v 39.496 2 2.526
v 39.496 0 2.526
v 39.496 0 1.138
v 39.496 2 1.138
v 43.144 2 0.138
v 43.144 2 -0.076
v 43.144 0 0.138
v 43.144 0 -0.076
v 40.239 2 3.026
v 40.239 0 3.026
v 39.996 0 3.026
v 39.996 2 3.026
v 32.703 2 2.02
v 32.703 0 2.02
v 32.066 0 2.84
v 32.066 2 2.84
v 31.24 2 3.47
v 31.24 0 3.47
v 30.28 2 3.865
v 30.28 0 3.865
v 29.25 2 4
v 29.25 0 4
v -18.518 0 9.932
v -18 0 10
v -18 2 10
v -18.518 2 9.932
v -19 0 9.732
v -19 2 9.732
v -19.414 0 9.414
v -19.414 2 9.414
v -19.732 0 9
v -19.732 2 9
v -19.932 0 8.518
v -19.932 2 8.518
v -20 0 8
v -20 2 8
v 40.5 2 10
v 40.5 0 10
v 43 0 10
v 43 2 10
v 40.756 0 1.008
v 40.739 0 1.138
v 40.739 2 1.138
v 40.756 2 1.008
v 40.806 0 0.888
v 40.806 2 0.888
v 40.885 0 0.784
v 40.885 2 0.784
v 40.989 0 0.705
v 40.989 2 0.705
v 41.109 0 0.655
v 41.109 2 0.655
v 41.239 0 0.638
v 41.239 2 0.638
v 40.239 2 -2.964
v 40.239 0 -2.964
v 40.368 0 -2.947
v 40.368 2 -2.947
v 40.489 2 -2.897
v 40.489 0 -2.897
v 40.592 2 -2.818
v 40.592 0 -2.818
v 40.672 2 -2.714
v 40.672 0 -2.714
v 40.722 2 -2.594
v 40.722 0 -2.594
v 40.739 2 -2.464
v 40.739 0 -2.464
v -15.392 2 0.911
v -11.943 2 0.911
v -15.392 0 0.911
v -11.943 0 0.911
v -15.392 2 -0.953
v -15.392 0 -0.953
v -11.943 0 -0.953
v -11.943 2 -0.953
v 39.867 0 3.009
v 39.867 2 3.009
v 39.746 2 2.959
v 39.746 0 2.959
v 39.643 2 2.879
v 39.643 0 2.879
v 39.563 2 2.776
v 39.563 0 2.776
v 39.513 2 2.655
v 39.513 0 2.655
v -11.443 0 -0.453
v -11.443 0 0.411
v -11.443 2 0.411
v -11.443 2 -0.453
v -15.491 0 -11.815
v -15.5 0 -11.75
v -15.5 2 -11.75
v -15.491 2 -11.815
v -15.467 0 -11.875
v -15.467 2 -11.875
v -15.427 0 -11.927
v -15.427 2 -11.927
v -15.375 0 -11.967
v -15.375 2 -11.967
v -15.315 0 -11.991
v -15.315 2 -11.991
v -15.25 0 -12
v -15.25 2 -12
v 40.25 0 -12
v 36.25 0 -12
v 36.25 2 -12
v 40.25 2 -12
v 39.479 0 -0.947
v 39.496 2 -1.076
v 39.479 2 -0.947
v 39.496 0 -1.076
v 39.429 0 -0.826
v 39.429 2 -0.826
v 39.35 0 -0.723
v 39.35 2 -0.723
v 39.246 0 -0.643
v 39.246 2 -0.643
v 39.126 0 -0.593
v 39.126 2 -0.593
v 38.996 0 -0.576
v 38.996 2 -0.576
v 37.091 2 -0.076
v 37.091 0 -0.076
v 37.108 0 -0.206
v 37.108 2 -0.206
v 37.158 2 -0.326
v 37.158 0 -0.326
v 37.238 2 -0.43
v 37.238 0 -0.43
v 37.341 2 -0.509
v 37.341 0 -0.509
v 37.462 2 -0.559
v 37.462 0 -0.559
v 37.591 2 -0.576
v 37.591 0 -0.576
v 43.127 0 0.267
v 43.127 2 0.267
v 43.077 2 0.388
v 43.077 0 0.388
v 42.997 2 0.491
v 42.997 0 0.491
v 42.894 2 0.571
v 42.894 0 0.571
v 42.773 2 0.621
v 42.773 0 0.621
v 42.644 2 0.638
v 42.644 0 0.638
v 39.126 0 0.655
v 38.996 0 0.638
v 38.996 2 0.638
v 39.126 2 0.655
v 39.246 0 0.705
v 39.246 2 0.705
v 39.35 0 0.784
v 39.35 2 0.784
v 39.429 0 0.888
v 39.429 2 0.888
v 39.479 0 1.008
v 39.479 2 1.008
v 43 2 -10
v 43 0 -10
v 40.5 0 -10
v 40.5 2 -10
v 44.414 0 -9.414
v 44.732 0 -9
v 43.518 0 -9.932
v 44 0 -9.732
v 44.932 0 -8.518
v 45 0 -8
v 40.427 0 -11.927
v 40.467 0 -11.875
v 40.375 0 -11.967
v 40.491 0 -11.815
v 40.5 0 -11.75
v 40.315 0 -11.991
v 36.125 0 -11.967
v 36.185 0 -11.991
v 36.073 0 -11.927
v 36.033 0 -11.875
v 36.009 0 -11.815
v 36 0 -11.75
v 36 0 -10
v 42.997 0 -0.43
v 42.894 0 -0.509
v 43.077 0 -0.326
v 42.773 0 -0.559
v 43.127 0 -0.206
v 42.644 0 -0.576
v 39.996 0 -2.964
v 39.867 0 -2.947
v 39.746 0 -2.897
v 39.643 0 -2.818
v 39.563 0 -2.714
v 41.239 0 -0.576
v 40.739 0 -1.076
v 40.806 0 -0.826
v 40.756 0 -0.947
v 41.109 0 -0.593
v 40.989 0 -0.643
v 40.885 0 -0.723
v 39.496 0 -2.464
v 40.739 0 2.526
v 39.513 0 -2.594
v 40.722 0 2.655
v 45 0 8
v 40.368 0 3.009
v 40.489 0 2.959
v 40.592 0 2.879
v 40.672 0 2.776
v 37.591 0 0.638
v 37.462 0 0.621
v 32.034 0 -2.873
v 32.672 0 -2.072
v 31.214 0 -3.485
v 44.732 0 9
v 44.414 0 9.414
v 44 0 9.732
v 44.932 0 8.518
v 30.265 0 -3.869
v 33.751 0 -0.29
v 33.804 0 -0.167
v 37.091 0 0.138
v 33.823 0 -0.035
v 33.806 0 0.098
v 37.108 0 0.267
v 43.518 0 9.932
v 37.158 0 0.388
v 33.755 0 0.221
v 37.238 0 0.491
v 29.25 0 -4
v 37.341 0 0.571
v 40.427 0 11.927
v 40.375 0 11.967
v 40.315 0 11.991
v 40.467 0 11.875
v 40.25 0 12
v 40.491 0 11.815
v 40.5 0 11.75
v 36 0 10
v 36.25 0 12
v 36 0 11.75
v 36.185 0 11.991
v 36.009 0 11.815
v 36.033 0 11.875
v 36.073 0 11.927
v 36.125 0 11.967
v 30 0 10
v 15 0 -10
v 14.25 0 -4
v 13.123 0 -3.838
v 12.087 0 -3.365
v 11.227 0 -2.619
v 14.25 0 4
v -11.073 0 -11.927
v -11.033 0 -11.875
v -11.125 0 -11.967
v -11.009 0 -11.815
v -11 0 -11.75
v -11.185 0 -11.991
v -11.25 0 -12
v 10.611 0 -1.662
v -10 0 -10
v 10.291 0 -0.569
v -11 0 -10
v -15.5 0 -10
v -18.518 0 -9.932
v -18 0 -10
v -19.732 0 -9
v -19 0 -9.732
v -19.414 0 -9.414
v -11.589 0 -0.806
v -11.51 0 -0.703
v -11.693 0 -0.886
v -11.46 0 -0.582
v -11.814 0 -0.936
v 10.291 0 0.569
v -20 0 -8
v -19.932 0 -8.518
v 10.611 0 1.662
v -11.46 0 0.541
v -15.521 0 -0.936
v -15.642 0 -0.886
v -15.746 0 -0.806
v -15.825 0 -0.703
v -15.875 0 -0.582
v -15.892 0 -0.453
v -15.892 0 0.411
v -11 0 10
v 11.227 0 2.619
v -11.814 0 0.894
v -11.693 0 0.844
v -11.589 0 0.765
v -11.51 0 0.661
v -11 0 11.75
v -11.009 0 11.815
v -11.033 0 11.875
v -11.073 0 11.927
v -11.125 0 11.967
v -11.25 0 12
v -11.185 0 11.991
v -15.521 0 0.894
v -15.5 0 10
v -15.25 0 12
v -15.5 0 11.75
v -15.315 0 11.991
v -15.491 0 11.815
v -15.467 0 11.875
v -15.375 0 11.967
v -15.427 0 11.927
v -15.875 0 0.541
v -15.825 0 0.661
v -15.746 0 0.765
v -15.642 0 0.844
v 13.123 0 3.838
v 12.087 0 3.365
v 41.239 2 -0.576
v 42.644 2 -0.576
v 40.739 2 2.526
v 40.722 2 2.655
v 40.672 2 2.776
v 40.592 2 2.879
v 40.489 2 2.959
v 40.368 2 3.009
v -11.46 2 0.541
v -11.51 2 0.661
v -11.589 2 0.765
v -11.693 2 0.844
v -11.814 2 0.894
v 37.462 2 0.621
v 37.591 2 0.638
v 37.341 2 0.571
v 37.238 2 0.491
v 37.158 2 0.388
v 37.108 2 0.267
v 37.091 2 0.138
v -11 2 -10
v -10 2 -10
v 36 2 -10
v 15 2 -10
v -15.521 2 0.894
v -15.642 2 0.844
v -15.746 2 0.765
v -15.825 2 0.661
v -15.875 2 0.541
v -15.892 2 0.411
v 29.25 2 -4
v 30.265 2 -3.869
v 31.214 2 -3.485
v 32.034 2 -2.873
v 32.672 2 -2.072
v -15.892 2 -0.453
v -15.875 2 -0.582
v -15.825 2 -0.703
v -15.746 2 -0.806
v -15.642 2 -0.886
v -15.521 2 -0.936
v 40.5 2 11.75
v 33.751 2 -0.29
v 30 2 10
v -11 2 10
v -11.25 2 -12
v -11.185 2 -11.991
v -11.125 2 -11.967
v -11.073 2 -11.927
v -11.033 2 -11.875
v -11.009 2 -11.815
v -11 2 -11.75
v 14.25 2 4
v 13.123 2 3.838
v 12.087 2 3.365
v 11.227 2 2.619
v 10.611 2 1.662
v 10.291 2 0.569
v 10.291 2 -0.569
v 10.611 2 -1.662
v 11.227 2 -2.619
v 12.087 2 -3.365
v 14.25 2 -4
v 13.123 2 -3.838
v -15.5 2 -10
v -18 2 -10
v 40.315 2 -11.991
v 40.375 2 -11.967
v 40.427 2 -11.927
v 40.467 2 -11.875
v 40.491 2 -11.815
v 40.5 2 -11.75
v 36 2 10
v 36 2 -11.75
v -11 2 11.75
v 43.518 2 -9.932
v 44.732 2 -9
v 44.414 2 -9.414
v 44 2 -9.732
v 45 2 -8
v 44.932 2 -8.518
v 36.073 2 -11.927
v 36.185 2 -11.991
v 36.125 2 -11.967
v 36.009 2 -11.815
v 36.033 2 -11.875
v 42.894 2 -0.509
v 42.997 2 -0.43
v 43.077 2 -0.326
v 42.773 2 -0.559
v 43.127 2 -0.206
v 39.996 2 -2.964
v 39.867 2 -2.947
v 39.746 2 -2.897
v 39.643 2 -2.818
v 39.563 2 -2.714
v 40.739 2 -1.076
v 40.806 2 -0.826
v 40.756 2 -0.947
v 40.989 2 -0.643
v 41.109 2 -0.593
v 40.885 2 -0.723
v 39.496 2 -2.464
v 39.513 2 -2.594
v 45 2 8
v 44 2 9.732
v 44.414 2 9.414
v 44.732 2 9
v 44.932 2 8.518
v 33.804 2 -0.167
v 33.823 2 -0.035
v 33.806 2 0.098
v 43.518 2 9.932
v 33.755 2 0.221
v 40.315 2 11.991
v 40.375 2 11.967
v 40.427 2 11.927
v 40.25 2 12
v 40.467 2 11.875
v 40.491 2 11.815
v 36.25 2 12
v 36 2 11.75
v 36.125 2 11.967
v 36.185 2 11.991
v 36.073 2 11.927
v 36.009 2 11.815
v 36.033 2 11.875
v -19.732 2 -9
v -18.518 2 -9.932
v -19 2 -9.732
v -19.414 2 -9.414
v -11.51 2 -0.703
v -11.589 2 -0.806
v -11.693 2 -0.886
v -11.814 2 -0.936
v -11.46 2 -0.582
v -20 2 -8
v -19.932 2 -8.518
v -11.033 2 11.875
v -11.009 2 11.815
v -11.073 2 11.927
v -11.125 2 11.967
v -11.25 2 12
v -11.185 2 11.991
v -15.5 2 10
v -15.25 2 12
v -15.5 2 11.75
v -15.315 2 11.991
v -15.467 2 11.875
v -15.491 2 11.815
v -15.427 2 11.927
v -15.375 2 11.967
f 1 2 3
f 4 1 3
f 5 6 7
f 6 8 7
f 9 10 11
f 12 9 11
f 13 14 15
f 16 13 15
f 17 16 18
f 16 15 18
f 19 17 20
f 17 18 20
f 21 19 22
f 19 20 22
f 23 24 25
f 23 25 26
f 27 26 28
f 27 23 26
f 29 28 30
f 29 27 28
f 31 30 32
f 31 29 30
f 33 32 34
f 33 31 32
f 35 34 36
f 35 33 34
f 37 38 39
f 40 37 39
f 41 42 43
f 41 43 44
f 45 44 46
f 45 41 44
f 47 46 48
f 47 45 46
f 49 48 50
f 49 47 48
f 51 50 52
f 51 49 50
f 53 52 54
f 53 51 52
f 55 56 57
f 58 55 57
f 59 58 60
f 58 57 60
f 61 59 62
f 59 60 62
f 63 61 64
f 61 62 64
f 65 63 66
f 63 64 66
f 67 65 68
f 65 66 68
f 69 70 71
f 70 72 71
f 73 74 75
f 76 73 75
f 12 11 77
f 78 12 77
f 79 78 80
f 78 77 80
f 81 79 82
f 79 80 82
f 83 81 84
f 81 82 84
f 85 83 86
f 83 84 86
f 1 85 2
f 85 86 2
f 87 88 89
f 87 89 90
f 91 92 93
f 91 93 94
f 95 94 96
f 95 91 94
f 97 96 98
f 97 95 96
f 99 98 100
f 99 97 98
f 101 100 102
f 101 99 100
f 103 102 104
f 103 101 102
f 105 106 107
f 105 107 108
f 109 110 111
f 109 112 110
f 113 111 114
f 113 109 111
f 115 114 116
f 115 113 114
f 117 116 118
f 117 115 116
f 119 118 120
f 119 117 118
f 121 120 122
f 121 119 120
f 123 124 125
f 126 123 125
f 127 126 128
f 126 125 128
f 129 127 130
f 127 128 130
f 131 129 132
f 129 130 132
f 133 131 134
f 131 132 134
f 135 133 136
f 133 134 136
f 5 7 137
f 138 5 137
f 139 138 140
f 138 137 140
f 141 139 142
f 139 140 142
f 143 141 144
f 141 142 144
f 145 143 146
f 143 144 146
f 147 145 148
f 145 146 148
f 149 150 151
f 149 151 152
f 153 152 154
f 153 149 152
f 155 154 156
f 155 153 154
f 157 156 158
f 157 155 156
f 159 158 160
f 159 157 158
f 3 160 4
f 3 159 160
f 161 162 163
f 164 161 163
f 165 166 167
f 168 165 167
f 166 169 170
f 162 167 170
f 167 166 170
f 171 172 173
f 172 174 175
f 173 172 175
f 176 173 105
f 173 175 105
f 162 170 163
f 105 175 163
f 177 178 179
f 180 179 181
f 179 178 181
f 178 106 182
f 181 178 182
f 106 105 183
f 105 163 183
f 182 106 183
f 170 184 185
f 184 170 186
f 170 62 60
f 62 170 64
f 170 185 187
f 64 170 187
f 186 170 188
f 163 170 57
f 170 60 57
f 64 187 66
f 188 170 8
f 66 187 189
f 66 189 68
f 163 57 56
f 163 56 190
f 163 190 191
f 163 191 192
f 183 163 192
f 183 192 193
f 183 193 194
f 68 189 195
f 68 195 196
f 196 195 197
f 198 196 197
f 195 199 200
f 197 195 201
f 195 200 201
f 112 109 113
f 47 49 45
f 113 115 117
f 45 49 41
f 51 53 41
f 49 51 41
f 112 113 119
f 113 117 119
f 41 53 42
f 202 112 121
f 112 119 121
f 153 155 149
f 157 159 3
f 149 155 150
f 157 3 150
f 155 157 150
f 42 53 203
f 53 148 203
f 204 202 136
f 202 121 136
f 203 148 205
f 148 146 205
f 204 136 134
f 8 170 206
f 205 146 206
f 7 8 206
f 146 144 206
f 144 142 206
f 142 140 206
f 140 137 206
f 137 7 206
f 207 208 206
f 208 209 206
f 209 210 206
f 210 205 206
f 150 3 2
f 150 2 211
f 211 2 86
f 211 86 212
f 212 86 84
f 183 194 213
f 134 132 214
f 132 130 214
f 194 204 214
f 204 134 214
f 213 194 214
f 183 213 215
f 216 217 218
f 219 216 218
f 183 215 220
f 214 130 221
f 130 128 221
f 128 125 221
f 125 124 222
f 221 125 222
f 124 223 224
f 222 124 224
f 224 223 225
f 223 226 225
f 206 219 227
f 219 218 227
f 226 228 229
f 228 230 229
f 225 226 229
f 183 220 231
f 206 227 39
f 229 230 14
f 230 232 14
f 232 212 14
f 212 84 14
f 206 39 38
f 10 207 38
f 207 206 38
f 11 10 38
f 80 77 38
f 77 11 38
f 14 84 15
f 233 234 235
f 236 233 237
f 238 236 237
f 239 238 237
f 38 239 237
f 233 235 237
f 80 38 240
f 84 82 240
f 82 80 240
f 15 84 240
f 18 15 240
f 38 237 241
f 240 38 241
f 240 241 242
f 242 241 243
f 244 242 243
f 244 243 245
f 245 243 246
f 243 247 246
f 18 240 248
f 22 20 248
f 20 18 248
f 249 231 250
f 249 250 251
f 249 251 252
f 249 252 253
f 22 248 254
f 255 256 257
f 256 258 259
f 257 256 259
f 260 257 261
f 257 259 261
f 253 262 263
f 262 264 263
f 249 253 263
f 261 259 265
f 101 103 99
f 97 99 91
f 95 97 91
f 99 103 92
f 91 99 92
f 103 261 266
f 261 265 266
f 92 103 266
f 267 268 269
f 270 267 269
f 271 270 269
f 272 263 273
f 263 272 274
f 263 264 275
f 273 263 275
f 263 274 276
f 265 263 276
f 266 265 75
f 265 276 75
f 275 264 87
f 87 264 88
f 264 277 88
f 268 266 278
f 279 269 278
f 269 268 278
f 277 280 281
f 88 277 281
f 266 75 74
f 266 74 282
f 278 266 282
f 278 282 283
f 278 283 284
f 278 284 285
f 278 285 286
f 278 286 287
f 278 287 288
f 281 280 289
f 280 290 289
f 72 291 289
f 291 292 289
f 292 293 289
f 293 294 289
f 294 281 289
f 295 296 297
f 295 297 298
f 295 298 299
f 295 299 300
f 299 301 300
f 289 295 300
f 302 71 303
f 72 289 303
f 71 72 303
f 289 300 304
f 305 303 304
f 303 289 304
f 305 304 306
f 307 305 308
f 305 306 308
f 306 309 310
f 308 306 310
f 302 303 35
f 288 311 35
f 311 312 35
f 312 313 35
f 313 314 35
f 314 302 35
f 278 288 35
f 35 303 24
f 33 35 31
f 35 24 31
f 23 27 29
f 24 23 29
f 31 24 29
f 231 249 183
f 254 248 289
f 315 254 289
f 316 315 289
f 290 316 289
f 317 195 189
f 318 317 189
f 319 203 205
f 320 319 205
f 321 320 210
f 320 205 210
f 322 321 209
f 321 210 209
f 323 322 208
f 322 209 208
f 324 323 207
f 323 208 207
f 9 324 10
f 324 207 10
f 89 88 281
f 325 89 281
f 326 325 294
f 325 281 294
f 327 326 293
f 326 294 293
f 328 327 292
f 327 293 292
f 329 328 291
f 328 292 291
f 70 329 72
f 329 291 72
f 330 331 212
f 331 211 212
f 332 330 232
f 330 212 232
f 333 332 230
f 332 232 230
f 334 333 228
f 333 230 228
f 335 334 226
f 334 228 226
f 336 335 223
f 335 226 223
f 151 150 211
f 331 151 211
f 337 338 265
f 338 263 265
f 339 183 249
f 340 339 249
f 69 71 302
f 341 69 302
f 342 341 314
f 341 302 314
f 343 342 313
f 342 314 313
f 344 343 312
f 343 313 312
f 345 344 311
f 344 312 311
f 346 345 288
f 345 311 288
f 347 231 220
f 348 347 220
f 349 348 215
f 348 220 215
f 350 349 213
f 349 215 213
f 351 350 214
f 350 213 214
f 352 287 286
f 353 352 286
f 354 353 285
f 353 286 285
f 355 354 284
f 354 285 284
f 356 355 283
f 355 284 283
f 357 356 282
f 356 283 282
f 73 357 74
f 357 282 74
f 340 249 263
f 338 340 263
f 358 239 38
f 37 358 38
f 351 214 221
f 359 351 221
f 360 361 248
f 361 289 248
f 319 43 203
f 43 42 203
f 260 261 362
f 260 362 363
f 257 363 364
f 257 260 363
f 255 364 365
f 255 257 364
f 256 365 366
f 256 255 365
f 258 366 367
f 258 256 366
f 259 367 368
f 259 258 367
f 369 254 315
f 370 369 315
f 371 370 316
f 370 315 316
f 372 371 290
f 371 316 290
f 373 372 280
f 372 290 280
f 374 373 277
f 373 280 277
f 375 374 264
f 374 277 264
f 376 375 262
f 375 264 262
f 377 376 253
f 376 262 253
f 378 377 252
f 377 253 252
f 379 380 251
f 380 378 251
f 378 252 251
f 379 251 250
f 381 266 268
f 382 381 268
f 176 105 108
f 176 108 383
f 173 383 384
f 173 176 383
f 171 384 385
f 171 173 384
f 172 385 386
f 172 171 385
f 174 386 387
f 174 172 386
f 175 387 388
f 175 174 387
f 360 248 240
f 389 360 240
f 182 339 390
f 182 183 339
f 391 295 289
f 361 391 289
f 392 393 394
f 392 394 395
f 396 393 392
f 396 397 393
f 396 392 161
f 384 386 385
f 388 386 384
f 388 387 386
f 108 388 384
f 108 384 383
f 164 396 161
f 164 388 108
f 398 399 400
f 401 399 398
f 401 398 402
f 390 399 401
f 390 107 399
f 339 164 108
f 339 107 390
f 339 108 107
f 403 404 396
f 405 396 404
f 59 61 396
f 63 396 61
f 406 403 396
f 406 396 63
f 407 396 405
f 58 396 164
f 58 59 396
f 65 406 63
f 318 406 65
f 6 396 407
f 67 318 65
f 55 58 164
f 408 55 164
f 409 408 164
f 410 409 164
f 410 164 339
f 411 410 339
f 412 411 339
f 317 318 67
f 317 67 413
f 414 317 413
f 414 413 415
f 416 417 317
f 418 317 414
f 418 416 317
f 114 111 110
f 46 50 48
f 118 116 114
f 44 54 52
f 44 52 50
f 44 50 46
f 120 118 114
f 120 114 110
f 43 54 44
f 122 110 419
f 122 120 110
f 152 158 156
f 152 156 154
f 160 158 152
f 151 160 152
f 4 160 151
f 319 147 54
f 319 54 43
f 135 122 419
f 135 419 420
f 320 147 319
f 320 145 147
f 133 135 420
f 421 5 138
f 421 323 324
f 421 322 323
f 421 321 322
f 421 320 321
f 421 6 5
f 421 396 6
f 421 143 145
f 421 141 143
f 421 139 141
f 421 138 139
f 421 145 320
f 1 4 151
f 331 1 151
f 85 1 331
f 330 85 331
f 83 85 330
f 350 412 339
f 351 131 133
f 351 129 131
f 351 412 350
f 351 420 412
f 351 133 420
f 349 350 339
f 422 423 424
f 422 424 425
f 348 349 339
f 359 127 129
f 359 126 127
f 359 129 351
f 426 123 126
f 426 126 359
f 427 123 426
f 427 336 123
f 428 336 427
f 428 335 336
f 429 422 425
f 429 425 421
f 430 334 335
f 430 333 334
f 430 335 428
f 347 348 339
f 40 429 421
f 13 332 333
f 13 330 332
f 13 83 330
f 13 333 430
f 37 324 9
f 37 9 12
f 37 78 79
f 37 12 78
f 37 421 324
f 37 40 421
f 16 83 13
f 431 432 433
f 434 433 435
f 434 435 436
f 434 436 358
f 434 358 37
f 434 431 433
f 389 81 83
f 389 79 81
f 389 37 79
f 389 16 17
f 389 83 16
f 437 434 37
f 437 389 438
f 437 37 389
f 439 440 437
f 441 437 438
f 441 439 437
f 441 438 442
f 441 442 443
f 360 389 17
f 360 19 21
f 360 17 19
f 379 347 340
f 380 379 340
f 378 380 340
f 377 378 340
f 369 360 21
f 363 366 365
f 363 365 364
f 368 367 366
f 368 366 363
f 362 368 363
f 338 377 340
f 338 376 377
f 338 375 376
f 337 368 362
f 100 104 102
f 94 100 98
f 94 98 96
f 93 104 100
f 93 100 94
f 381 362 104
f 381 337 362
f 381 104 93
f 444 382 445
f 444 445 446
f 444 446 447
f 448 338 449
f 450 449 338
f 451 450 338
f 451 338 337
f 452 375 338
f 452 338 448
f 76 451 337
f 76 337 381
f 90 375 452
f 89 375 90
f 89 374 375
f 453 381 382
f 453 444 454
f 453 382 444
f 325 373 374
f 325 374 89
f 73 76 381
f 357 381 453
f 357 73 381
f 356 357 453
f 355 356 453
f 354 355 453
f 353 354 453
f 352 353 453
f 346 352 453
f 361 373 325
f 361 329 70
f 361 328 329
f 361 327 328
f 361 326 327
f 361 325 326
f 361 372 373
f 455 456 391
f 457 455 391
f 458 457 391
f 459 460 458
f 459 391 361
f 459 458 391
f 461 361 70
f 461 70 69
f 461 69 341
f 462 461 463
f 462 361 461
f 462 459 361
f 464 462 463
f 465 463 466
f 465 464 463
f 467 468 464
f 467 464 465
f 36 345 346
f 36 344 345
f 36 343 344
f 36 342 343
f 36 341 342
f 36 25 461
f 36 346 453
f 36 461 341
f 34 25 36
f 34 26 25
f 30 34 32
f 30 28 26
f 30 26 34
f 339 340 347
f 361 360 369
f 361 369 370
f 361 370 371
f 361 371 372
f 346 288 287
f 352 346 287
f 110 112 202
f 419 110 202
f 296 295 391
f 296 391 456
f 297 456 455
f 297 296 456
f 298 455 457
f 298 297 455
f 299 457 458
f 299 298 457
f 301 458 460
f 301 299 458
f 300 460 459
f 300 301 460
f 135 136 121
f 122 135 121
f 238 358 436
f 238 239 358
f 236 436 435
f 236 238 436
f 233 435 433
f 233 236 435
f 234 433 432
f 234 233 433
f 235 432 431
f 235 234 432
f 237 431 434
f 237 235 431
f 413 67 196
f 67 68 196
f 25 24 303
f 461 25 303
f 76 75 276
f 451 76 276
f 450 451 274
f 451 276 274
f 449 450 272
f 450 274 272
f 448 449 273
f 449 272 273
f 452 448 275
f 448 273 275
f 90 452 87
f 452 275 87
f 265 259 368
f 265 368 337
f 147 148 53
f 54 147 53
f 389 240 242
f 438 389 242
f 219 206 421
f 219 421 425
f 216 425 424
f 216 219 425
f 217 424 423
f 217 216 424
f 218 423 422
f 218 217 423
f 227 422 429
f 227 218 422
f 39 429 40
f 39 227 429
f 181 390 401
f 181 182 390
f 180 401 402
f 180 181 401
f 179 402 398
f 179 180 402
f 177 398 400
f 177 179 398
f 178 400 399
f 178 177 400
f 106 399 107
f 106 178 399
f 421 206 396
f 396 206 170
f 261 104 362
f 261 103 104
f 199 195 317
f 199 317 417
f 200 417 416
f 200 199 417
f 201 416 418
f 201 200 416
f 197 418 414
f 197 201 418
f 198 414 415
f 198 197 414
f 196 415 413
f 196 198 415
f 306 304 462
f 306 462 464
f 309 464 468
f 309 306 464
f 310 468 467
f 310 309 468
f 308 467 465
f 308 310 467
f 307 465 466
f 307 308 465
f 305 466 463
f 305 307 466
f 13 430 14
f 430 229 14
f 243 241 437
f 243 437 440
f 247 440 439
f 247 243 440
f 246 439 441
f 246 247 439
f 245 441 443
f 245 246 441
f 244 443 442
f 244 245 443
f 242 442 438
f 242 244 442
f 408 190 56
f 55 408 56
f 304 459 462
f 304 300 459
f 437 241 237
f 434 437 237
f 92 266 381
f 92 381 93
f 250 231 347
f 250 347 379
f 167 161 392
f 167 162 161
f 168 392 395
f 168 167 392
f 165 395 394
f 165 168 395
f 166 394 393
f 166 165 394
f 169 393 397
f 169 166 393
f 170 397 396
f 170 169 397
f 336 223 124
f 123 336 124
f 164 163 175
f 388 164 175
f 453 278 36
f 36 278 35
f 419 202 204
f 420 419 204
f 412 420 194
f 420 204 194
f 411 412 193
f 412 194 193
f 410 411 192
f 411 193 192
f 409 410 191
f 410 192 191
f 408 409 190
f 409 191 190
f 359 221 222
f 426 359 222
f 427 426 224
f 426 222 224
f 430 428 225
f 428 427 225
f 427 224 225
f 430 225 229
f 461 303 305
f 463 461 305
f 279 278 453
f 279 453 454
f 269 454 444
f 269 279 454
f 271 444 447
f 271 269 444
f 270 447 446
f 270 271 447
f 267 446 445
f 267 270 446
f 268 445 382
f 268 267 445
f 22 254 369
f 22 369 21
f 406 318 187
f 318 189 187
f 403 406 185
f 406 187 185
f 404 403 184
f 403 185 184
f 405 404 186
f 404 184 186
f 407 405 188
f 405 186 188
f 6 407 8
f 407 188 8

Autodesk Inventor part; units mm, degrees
ref_plane "YZ Plane" through (0, 0, 0) normal (1, 0, 0) x (0, 1, 0)
ref_plane "XZ Plane" through (0, 0, 0) normal (0, 1, 0) x (-1, 0, 0)
ref_plane "XY Plane" through (0, 0, 0) normal (0, 0, 1) x (1, 0, 0)
sketch "Sketch1" plane through (0, 0, 0) normal (0, 1, 0) x (-1, 0, 0)
  line L0 (15.892, 0.4112) -> (15.892, -0.4526)
  line L1 (15.392, -0.9526) -> (11.943, -0.9526)
  line L2 (11.943, 0.9112) -> (15.392, 0.9112)
  line L3 (15.392, 0.9112) -> (11.943, 0.9112)
  line L4 (15.892, -0.4526) -> (15.892, 0.4112)
  line L5 (15.392, -0.9526) -> (11.943, -0.9526)
  line L6 (11.943, -0.9526) -> (15.392, -0.9526)
  line L7 (-39.4963, 2.5258) -> (-39.4963, 1.1377)
  line L8 (-39.4963, -1.0763) -> (-39.4963, -2.4644)
  line L9 (-42.6438, 0.6377) -> (-41.2386, 0.6377)
  line L10 (-38.9963, 0.6377) -> (-37.5911, 0.6377)
  line L11 (-40.7386, -2.4644) -> (-40.7386, -1.0763)
  line L12 (-40.7386, 1.1377) -> (-40.7386, 2.5258)
  line L13 (-37.5911, -0.5763) -> (-38.9963, -0.5763)
  line L14 (-41.2386, -0.5763) -> (-42.6438, -0.5763)
  line L15 (-37.0911, 0.1377) -> (-37.0911, -0.0763)
  line L16 (-39.9963, -2.9644) -> (-40.2386, -2.9644)
  line L17 (-43.1438, -0.0763) -> (-43.1438, 0.1377)
  line L18 (-40.2386, 3.0258) -> (-39.9963, 3.0258)
  arc A0 (-39.4963, 2.5258) -> (-39.9963, 3.0258) centre (-39.9963, 2.5258) ccw
  arc A1 (-40.2386, 3.0258) -> (-40.7386, 2.5258) centre (-40.2386, 2.5258) ccw
  arc A2 (-41.2386, 0.6377) -> (-40.7386, 1.1377) centre (-41.2386, 1.1377) ccw
  arc A3 (-42.6438, 0.6377) -> (-43.1438, 0.1377) centre (-42.6438, 0.1377) ccw
  arc A4 (-43.1438, -0.0763) -> (-42.6438, -0.5763) centre (-42.6438, -0.0763) ccw
  arc A5 (-40.7386, -1.0763) -> (-41.2386, -0.5763) centre (-41.2386, -1.0763) ccw
  arc A6 (-40.7386, -2.4644) -> (-40.2386, -2.9644) centre (-40.2386, -2.4644) ccw
  arc A7 (-39.9963, -2.9644) -> (-39.4963, -2.4644) centre (-39.9963, -2.4644) ccw
  arc A8 (-38.9963, -0.5763) -> (-39.4963, -1.0763) centre (-38.9963, -1.0763) ccw
  arc A9 (-39.4963, 1.1377) -> (-38.9963, 0.6377) centre (-38.9963, 1.1377) ccw
  arc A10 (-37.0911, 0.1377) -> (-37.5911, 0.6377) centre (-37.5911, 0.1377) ccw
  arc A11 (-37.5911, -0.5763) -> (-37.0911, -0.0763) centre (-37.5911, -0.0763) ccw
  line L19 (-45, 8) -> (-45, -8)
  line L20 (11.443, 0.4112) -> (11.443, -0.4526)
  arc A12 (15.392, -0.9526) -> (15.892, -0.4526) centre (15.392, -0.4526) ccw
  arc A13 (15.892, 0.4112) -> (15.392, 0.9112) centre (15.392, 0.4112) ccw
  arc A14 (11.943, 0.9112) -> (11.443, 0.4112) centre (11.943, 0.4112) ccw
  arc A15 (11.443, -0.4526) -> (11.943, -0.9526) centre (11.943, -0.4526) ccw
  arc A16 (-43, 10) -> (-45, 8) centre (-43, 8) ccw
  arc A17 (-45, -8) -> (-43, -10) centre (-43, -8) ccw
  line L21 (-29.25, -2) -> (-29.25, 2) construction
  line L22 (-15, -10) -> (11, -10)
  line L23 (15.5, -10) -> (18, -10)
  line L24 (18, 10) -> (15.5, 10)
  line L25 (11, 10) -> (-30, 10)
  line L26 (-15, -10) -> (10, -10)
  line L27 (-12.5, 7) -> (-12.5, 30.9822) construction
  line L28 (-12.5, -7) -> (-12.5, -36.1495) construction
  line L29 (-30, 10) -> (-36, 10)
  line L30 (-40.5, 10) -> (-43, 10)
  line L31 (-43, -10) -> (-40.5, -10)
  line L32 (-36, -10) -> (-15, -10)
  line L33 (-43.1438, 0) -> (-43.1438, -0.0763) construction
  line L34 (-43, -10) -> (-43, -10) construction
  line L35 (20, -8) -> (20, 8)
  arc A18 (18, -10) -> (20, -8) centre (18, -8) ccw
  arc A19 (20, 8) -> (18, 10) centre (18, 8) ccw
  line L36 (15.5, -10) -> (18, -10)
  line L37 (18, 10) -> (15.5, 10)
  line L38 (15.5, -10) -> (15.5, -11.75)
  line L39 (15.25, -12) -> (11.25, -12)
  line L40 (11, -11.75) -> (11, -10)
  line L41 (15.5, 10) -> (15.5, 11.75)
  line L42 (11, 11.75) -> (11, 10)
  line L43 (-36, 10) -> (-36, 11.75)
  line L44 (-36.25, 12) -> (-40.25, 12)
  line L45 (-40.5, 11.75) -> (-40.5, 10)
  line L46 (-36, -10) -> (-36, -11.75)
  line L47 (-36.25, -12) -> (-40.25, -12)
  line L48 (-40.5, -10) -> (-40.5, -11.75)
  arc A20 (-36, 11.75) -> (-36.25, 12) centre (-36.25, 11.75) ccw
  arc A21 (-40.25, 12) -> (-40.5, 11.75) centre (-40.25, 11.75) ccw
  arc A22 (-40.5, -11.75) -> (-40.25, -12) centre (-40.25, -11.75) ccw
  arc A23 (-36.25, -12) -> (-36, -11.75) centre (-36.25, -11.75) ccw
  arc A24 (15.25, -12) -> (15.5, -11.75) centre (15.25, -11.75) ccw
  arc A25 (11, -11.75) -> (11.25, -12) centre (11.25, -11.75) ccw
  arc A26 (15.5, 11.75) -> (15.25, 12) centre (15.25, 11.75) ccw
  arc A27 (11.25, 12) -> (11, 11.75) centre (11.25, 11.75) ccw
  line L49 (11.25, 12) -> (15.25, 12)
  line L50 (-29.25, 0) -> (-14.25, 0) construction
  line L51 (-29.25, 0) -> (-14.25, 0) construction
  line L52 (-29.25, -4) -> (-14.25, -4)
  line L53 (-14.25, 4) -> (-29.25, 4)
  arc A28 (-14.25, -4) -> (-14.25, 4) centre (-14.25, 0) ccw
  line L54 (-32.6715, -2.0721) -> (-33.7507, -0.2901)
  line L55 (-33.7546, 0.2214) -> (-32.7027, 2.0197)
  arc A29 (-29.25, 4) -> (-32.7027, 2.0197) centre (-29.25, 0) ccw
  arc A30 (-32.6715, -2.0721) -> (-29.25, -4) centre (-29.25, 0) ccw
  arc A31 (-33.7546, 0.2214) -> (-33.7507, -0.2901) centre (-33.323, -0.0311) ccw
  point P0 (15.5, -12)
  point P1 (15.5, 12)
  point P2 (11, 12)
  point P3 (-36, 12)
  point P4 (-40.5, 12)
  point P5 (-36, -12)
  point P6 (-40.5, -12)
  point P7 (-21.75, 0)
  dimension "d2" = 0.5
  dimension "d4" = 0.5
  dimension "d38" = 2
  dimension "d40" = 0.25
  dimension "d41" = 47
  dimension "d42" = 47
  dimension "d43" = 56
  dimension "d44" = 15
  dimension "d45" = 15.75
  dimension "d46" = 8
  dimension "d47" = 0.5
extrude "Extrusion1" add sketch "Sketch1" along normal blind 2
properties part number "Laser-Slot-Bottom" material "Acrylic, Clear"
